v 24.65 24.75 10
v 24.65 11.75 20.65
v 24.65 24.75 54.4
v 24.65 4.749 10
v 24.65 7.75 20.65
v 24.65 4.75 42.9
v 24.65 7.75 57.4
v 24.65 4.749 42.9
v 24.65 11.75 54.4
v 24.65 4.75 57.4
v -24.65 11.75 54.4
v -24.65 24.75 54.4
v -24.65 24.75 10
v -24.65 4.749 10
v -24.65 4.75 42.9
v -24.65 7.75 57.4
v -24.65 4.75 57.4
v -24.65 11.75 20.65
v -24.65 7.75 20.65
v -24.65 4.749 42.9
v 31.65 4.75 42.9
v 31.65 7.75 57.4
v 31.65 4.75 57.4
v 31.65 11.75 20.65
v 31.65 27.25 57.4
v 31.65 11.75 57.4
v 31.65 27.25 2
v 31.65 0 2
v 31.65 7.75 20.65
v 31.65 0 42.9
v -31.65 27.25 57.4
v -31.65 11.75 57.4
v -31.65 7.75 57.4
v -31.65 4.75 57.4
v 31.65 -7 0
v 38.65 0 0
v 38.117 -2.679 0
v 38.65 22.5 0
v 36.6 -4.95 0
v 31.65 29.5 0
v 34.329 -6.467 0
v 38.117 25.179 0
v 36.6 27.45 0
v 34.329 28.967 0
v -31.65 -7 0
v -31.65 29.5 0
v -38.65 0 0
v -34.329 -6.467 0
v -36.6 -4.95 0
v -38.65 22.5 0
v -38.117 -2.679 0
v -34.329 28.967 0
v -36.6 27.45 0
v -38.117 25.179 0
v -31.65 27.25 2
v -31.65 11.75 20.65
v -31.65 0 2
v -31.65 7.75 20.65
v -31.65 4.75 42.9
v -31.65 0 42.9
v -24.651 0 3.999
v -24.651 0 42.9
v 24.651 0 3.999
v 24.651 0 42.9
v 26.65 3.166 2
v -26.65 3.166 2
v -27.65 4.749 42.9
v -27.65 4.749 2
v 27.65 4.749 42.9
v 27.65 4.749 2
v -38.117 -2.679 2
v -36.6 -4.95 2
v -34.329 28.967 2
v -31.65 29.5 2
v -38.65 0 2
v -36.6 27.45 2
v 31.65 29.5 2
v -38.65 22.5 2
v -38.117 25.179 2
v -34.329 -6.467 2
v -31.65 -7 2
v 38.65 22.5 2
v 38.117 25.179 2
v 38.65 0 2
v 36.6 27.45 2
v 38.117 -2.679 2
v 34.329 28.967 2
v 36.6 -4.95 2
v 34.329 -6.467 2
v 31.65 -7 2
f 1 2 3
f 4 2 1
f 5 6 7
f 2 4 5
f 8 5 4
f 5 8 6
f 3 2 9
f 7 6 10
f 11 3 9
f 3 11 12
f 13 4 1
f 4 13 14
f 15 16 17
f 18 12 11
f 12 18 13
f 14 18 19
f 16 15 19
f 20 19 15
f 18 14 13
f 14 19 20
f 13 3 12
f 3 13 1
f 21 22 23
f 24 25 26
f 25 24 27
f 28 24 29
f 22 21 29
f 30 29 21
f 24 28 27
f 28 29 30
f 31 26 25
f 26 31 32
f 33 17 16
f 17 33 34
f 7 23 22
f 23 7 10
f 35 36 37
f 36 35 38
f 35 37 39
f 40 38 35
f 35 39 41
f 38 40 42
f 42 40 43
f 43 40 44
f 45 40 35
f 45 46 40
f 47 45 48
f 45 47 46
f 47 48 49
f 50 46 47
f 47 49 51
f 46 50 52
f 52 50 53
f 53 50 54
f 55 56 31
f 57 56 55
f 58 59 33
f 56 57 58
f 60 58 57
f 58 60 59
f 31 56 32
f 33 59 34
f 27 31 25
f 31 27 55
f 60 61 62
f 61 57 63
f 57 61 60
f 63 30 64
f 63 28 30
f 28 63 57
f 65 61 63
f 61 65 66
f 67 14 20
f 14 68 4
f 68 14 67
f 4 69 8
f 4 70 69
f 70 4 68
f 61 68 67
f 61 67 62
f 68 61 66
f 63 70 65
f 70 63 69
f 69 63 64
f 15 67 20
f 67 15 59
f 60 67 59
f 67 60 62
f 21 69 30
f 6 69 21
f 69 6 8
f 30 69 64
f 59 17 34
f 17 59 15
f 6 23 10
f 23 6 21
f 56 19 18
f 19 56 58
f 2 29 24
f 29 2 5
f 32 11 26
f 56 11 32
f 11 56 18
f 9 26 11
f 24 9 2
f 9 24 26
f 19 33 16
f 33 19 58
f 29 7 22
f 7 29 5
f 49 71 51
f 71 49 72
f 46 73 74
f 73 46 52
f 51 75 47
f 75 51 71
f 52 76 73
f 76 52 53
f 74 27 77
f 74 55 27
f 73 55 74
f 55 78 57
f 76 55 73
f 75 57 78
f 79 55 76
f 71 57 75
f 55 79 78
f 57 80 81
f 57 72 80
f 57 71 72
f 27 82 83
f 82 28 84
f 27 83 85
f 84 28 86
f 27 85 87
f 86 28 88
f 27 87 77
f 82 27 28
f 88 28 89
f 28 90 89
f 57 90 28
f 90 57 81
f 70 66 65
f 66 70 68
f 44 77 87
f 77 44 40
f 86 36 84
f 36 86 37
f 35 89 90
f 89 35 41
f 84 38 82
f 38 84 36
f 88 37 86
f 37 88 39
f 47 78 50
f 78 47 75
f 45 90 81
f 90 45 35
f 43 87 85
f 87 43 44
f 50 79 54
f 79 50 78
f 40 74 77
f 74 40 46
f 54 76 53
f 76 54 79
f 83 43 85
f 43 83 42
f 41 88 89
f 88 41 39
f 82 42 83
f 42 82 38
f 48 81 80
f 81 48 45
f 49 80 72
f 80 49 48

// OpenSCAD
length = 100;
throatWidth = 45;
throatHeight = 40;
mouthWidth = 120;
mouthHeight = 60;
wallThickness = 1.4;
numSections = 20;
flangeLength = 4;
flangeFlare = 3;
// you can choose whether to generate the horn or the holder
watchHolder = 1; // [1:yes, 0:no]
holderCutFromFront = 3;
holderCutHeight = 23;
holderCutThickness = 4;
holderBackWall = 2.5;
holderSideWall = 4;
holderCeiling = 3;
holderDepth = 20;
holderFootWidth = 7;
holderFootThickness = 2;
tolerance = 0.75;

module end_of_parameters_dummy() {}

//use <horn.scad>;
//use <tubemesh.scad>;
// params = [sections,sectionCounts]

// written for tail-recursion
// _subtotals[i] = list[0] + ... + list[i-1]
function _subtotals(list,soFar=[]) =
        len(soFar) >= 1+len(list) ? soFar :
        _subtotals(list,
            let(n1=len(soFar))
            concat(soFar, n1>0 ? soFar[n1-1]+list[n1-1] : 0));

function _flatten(list) = [for (a=list) for(b=a) b];

function _reverseTriangle(t) = [t[2], t[1], t[0]];

// smallest angle in triangle
function _minAngle(p1,p2,p3) =
    let(a = p2-p1,
        b = p3-p1,
        c = p3-p2,
        v1 = a*b,
        v2 = -(c*a))
        v1 == 0 || v2 == 0 ? 0 :
        let( na = norm(a),
             a1 = acos(v1 / (na*norm(b))),
             a2 = acos(v2 / (na*norm(c))) )
        min(a1,a2,180-(a1+a2));

// triangulate square to maximize smallest angle
function _doSquare(points,i11,i21,i22,i12,optimize=true) =
    points[i11]==points[i12] ? [[i11,i21,i22]] :
    points[i21]==points[i22] ? [[i22,i12,i11]] :
    !optimize ? [[i11,i21,i22], [i22,i12,i11]] :
    let (m1 = min(_minAngle(points[i11],points[i21],points[i22]), _minAngle(points[i22],points[i12],points[i11])),
        m2 = min(_minAngle(points[i11],points[i21],points[i12]),
                _minAngle(points[i21],points[i22],points[i12])) )
        m2 <= m1 ? [[i11,i21,i22], [i22,i12,i11]] :
                  [[i11,i21,i12], [i21,i22,i12]];

/*
function _inTriangle(v1,t) = (v1==t[0] || v1==t[1] || v1==t[2]);

function _findTheDistinctVertex(t1,t2) =
    let(in = [for(i=[0:2]) _inTriangle(t1[i],t2)])
    ! in[0] && in[1] && in[2] ? 0 :
    ! in[1] && in[0] && in[2] ? 1 :
    ! in[2] && in[0] && in[1] ? 2 :
    undef;

// make vertex i come first
function _rotateTriangle(t,i) =
    [for (j=[0:2]) t[(j+i)%3]];

function _optimize2Triangles(points,t1,t2) =
    let(i1 = _findTheDistinctVertex(t1,t2))
    i1 == undef ? [t1,t2] :
    let(i2 = _findTheDistinctVertex(t2,t1))
    i2 == undef ? [t1,t2] :
    let(t1 = _rotateTriangle(t1,i1),
        t2 = _rotateTriangle(t2,i2))
    _doSquare(points,t1[1],t2[0],t2[1],t1[0],optimize=true);

// a greedy optimization for a strip of triangles most of which adjoin one another; written for tail-recursion
function _optimizeTriangles(points,triangles,position=0,optimize=true,iterations=4) =
        !optimize || position >= iterations*len(triangles) ? triangles :
            _optimizeTriangles(points,
                let(
                    n = len(triangles),
                    position1=position%n,
                    position2=(position+1)%n,
                    opt=_optimize2Triangles(points,triangles[position1],triangles[position2]))
                    [for (i=[0:len(triangles)-1])
                        i == position1 ? opt[0] :
                        i == position2 ? opt[1] :
                            triangles[i]],
                position=position+1);
*/

function _removeEmptyTriangles(points,triangles) =
    [for(t=triangles)
        if(true || points[t[0]] != points[t[1]] && points[t[1]] != points[t[2]] && points[t[2]] != points[t[0]]) t];

// n1 and n2 should be fairly small, so this doesn't need
// tail-recursion
// this assumes n1<=n2
function _tubeSegmentTriangles(points,index1,n1,index2,n2,i=0,soFar=[],optimize=true)
    = i>=n2 ? _removeEmptyTriangles(points,soFar) :
            let(i21=i,
                i22=(i+1)%n2,
                i11=floor((i21)*n1/n2+0.5)%n1,
                i12=floor((i22)*n1/n2+0.5)%n1,
                add = i11==i12 ? [[index1+i11,index2+i21,index2+i22]] :
                    _doSquare(points,index1+i11,index2+i21,index2+i22,index1+i12,optimize=optimize))
                _tubeSegmentTriangles(points,index1,n1,index2,n2,i=i+1,soFar=concat(soFar,add),optimize=optimize);

function _tubeSegmentFaces(points,index,n1,n2,optimize=true)
    = n1<n2 ? _tubeSegmentTriangles(points,index,n1,index+n1,n2,optimize=optimize) :
        [for (f=_tubeSegmentTriangles(points,index+n1,n2,index,n1,optimize=optimize)) _reverseTriangle(f)];

function _tubeMiddleFaces(points,counts,subtotals,optimize=true) = [ for (i=[1:len(counts)-1])
           for (face=_tubeSegmentFaces(points,subtotals[i-1],counts[i-1],counts[i],optimize=optimize)) face ];

function _endCaps(counts,subtotals,startCap=true,endCap=true) =
    let( n = len(counts),
         cap1 = counts[0]<=2 || !startCap ? undef : [for(i=[0:counts[0]-1]) i],
         cap2 = counts[n-1]<=2 || !endCap ? undef : [for(i=[counts[n-1]-1:-1:0]) subtotals[n-1]+i] )
       [for (c=[cap1,cap2]) if (c!=undef) c];

function _tubeFaces(sections,startCap=true,endCap=true,optimize=true) =
                let(
        counts = [for (s=sections) len(s)],
        points = _flatten(sections),
        subtotals = _subtotals(counts))
            concat(_tubeMiddleFaces(points,counts,subtotals,optimize=optimize),_endCaps(counts,subtotals,startCap=true,endCap=true));

function _removeDuplicates1(points,soFar=[[],[]]) =
        len(soFar[0]) >= len(points) ? soFar :
            _removeDuplicates1(points,
               let(
                mapSoFar=soFar[0],
                pointsSoFar=soFar[1],
                j=len(mapSoFar),
                k=search([points[j]], pointsSoFar)[0])
                k == []? [concat(mapSoFar,[len(pointsSoFar)]),
                            concat(pointsSoFar,[points[j]])] :
                           [concat(mapSoFar,[k]),pointsSoFar]);

function _removeDuplicates(points, faces) =
    let(fix=_removeDuplicates1(points),
        map=fix[0],
        newPoints=fix[1],
        newFaces=[for(f=faces) [for(v=f) map[v]]])
            [newPoints, newFaces];

function pointsAndFaces(sections,startCap=true,endCap=true,optimize=true) =
        let(
            points0=_flatten(sections),
            faces0=_tubeFaces(sections,startCap=startCap,endCap=endCap,optimize=optimize)) [points0,faces0];
//        _removeDuplicates(points0,faces0);

// increase number of points from len(section) to n
function _interpolateSection(section,n) =
        let(m=len(section))
        n == m ? section :
        n < m ? undef :
            [for(i=[0:m-1])
                let(cur=floor(i*n/m),
                    k=floor((i+1)*n/m)-cur,
                    i2=(i+1)%m)
                    for(j=[0:k-1])
                        let(t=j/k)
                            section[i]*(1-t)+section[i2]*t];

function ngonPoints(n=4,r=10,d=undef,rotate=0,z=undef) =
            let(r=d==undef?r:d/2)
            z==undef ?
            r*[for(i=[0:n-1]) let(angle=i*360/n+rotate) [cos(angle),sin(angle)]] :
            [for(i=[0:n-1]) let(angle=i*360/n+rotate) [r*cos(angle),r*sin(angle),z]];

function starPoints(n=10,r1=5,r2=10,rotate=0,z=undef) =
          z==undef ?
            [for(i=[0:2*n-1]) let(angle=i*180/n+rotate) (i%2?r1:r2) * [cos(angle),sin(angle)]] :
            [for(i=[0:2*n-1]) let(angle=i*180/n+rotate, r=i%2?r1:r2) [r*cos(angle),r*sin(angle),z]];

// warning: no guarantee of perfect convexity
module mySphere(r=10,d=undef) {
    GA = 2.39996322972865332 * 180 / PI;
    radius = d==undef ? r : d/2;
    pointsAround =
        $fn ? $fn :
        max(3, floor(0.5+360/$fa), floor(0.5+2*radius*PI/$fs));
    numSlices0 = (pointsAround + pointsAround % 2)/2;
    numSlices = numSlices0 + (numSlices0%2);
    sections = radius*[for(i=[0:numSlices])
                    i == 0 ? [[0,0,-1]] :
                    i == numSlices ? [[0,0,1]] :
                    let(
                        lat = (i-numSlices/2)/(numSlices/2)*90,
                        z1 = sin(lat),
                        r1 = cos(lat),
                        count = max(3,floor(0.5 + pointsAround * abs(r1))))
                        ngonPoints(count,r=r1,z=z1)];
    data = pointsAndFaces(sections,optimize=false);
    polyhedron(points=data[0], faces=data[1]);
}

module morphExtrude(section1,section2,height=undef,twist=0,numSlices=10,startCap=true,endCap=true,optimize=false) {
    n = max(len(section1),len(section2));

    section1interp = _interpolateSection(section1,n);
    section2interp = _interpolateSection(section2,n);
    sections = height == undef ?
                      [for(i=[0:numSlices])
                        let(t=i/numSlices)
                        (1-t)*section1interp+t*section2interp] :
                      [for(i=[0:numSlices])
                        let(t=i/numSlices,
                            theta = t*twist,
                            section=(1-t)*section1interp+t*section2interp)
                        [for(p=section) [p[0]*cos(theta)-p[1]*sin(theta),p[0]*sin(theta)+p[1]*cos(theta),height*t]]];

    data = pointsAndFaces(sections,startCap=startCap,endCap=endCap,optimize=false);
    polyhedron(points=data[0], faces=data[1]);
}

module cone(r=10,d=undef,height=10) {
    radius = d==undef ? r : d/2;
    pointsAround =
        $fn ? $fn :
        max(3, floor(0.5+360/$fa), floor(0.5+2*radius*PI/$fs));
    morphExtrude(ngonPoints(n=pointsAround,r=radius), [[0,0]], height=height,optimize=false);
}

module prism(base=[[0,0,0],[1,0,0],[0,1,0]], vertical=[0,0,1]) {
    morphExtrude(base,[for(v=base) v+vertical],numSlices=1);
}


module dummy(){}

module horn(throat=[45,40], mouth=[120,60], length=100, wallThickness=1.4, numSections=20, flangeLength=4, flangeFlare=3, rectangular=true, solidFlangeOnly=false) {

    function getExponent(ratio) = pow(ratio, 1/length);

    mouthWidth = len(mouth)==2 ? mouth[0] : mouth;
    mouthHeight = len(mouth)==2 ? mouth[1] : mouth;
    throatWidth = len(throat)==2 ? throat[0] : throat;
    throatHeight = len(throat)==2 ? throat[1] : throat;

    wExp = getExponent(mouthWidth/throatWidth);
    hExp = getExponent(mouthHeight/throatHeight);

    function section(x,y,z) =
        rectangular ?
            [ [x,y,z], [-x,y,z], [-x,-y,z], [x,-y,z] ]:
            [ for(t=[0:10:350]) [x*cos(t), y*sin(t), z]];

    sections =
        [ for(i=[0:numSections])
            let(z=i/numSections*length,
                x=pow(wExp,length-z)*throatWidth/2,
                y=pow(hExp,length-z)*throatHeight/2)
            section(x,y,z) ];

    module hornShape() {
        data = pointsAndFaces(sections,startCap=true,endCap=true,optimize=true);
        polyhedron(points=data[0], faces=data[1]);
    }

/*    module hornShellQuick() {
        render(convexity=2)
        difference() {
            scale([(mouthWidth+wallThickness*2)/mouthWidth,(mouthHeight+wallThickness*2)/mouthHeight,1]) hornShape();
        }
    } */

    module hornShellGood() {
        render(convexity=2)
        intersection() {
            difference() {
                minkowski() {
                    hornShape();
                    sphere(r=wallThickness,$fn=12);
                }
                hornShape();
            }
            translate([-mouthWidth/2-wallThickness,-mouthHeight/2-wallThickness,0])
            cube([mouthWidth+2*wallThickness,mouthHeight+2*wallThickness,length]);
        }
    }

    module flange(hollow=true) {
        if (flangeLength>0) {
            x1 = throatWidth/2+wallThickness;
            y1 = throatHeight/2+wallThickness;
            x2 = x1 + flangeFlare;
            y2 = y1 + flangeFlare;
            render(convexity=2)
            difference() {
                morphExtrude(section(x1,y1,0), section(x2,y2,flangeLength),numSlices=1);
                if (hollow)
                    morphExtrude(section(throatWidth/2,throatHeight/2,-1), section(throatWidth/2,throatHeight/2,flangeLength+1),numSlices=1);
            }
        }
    }

    if (!solidFlangeOnly)
        hornShellGood();
    translate([0,0,solidFlangeOnly?0:length-0.001]) flange(hollow=!solidFlangeOnly);
}
//use <roundedsquare.scad>;
module roundedSquare(size=[10,10], radius=1, center=false, $fn=16) {
    size1 = (size+0==size) ? [size,size] : size;
    if (radius <= 0) {
        square(size1, center=center);
    }
    else {
        translate(center ? -size1/2 : [0,0])
        hull() {
            translate([radius,radius]) circle(r=radius);
            translate([size1[0]-radius,radius]) circle(r=radius);
            translate([size1[0]-radius,size1[1]-radius]) circle(r=radius);
            translate([radius,size1[1]-radius]) circle(r=radius);
        }
    }
}

module roundedOpenTopBox(size=[10,10,10], radius=2, wall=1, solid=false) {
    render(convexity=2)
    difference() {
        linear_extrude(height=size[2]) roundedSquare(size=[size[0],size[1]], radius=radius);
        if (!solid) {
            translate([0,0,wall])
            linear_extrude(height=size[2]-wall)
            translate([wall,wall]) roundedSquare(size=[size[0]-2*wall,size[1]-2*wall], radius=radius-wall);
        }
    }
}


module dummy(){}

nudge = 0.001;

module myHorn() {
    horn(length=length, throat=[throatWidth,throatHeight], mouth=[mouthWidth,mouthHeight], wallThickness=wallThickness, numSections=numSections, flangeLength=flangeLength, flangeFlare=flangeFlare);
}

module myFlange() {
    horn(length=length, throat=[throatWidth+tolerance*2,throatHeight+tolerance*2+flangeFlare*4], mouth=[mouthWidth+tolerance*2,mouthHeight+tolerance*2], wallThickness=wallThickness, numSections=numSections, flangeLength=flangeLength+tolerance, flangeFlare=flangeFlare, solidFlangeOnly=true);
}

module holder() {
    w = throatWidth + 2 * wallThickness + 2*flangeFlare + 2*tolerance + 2*holderSideWall;
    h0 = 0.5 * (mouthHeight - throatHeight);
    h = throatHeight + 2*flangeFlare + h0 + wallThickness;
    render(convexity=5)
    difference() {
        translate([-w/2,0,0])
        cube([w,flangeLength+tolerance+holderDepth+holderBackWall,h]);

        translate([0,-nudge,h0+throatHeight/2+wallThickness+tolerance])
        rotate([-90,0,0])
        myFlange();
    translate([-w/2-nudge,-nudge,h0+throatHeight*0.75+wallThickness+2*tolerance]) cube([w+2*nudge,flangeLength+tolerance+nudge,nudge+flangeFlare+throatHeight]);

        translate([-w/2-nudge,tolerance+flangeLength+holderCutFromFront,h0+throatHeight/2+wallThickness+tolerance-holderCutHeight/2]) cube([w+2*nudge,holderCutThickness,h]);
        translate([-w/2+holderSideWall+flangeFlare,-nudge,h0]) {
            cube([w-2*holderSideWall-2*flangeFlare,flangeLength+tolerance+holderDepth+nudge,h-h0-holderCeiling]);
            cube([w-2*holderSideWall-2*flangeFlare,flangeLength+holderCutFromFront+holderCutThickness+nudge,h+nudge-h0]);
        }
    }
    linear_extrude(height=holderFootThickness)
    translate([-w/2-holderFootWidth,-holderFootWidth])
    roundedSquare([w+2*holderFootWidth,holderDepth+holderBackWall+2*holderFootWidth],radius=holderFootWidth);
}

if (watchHolder)
    holder();
else
    myHorn();
